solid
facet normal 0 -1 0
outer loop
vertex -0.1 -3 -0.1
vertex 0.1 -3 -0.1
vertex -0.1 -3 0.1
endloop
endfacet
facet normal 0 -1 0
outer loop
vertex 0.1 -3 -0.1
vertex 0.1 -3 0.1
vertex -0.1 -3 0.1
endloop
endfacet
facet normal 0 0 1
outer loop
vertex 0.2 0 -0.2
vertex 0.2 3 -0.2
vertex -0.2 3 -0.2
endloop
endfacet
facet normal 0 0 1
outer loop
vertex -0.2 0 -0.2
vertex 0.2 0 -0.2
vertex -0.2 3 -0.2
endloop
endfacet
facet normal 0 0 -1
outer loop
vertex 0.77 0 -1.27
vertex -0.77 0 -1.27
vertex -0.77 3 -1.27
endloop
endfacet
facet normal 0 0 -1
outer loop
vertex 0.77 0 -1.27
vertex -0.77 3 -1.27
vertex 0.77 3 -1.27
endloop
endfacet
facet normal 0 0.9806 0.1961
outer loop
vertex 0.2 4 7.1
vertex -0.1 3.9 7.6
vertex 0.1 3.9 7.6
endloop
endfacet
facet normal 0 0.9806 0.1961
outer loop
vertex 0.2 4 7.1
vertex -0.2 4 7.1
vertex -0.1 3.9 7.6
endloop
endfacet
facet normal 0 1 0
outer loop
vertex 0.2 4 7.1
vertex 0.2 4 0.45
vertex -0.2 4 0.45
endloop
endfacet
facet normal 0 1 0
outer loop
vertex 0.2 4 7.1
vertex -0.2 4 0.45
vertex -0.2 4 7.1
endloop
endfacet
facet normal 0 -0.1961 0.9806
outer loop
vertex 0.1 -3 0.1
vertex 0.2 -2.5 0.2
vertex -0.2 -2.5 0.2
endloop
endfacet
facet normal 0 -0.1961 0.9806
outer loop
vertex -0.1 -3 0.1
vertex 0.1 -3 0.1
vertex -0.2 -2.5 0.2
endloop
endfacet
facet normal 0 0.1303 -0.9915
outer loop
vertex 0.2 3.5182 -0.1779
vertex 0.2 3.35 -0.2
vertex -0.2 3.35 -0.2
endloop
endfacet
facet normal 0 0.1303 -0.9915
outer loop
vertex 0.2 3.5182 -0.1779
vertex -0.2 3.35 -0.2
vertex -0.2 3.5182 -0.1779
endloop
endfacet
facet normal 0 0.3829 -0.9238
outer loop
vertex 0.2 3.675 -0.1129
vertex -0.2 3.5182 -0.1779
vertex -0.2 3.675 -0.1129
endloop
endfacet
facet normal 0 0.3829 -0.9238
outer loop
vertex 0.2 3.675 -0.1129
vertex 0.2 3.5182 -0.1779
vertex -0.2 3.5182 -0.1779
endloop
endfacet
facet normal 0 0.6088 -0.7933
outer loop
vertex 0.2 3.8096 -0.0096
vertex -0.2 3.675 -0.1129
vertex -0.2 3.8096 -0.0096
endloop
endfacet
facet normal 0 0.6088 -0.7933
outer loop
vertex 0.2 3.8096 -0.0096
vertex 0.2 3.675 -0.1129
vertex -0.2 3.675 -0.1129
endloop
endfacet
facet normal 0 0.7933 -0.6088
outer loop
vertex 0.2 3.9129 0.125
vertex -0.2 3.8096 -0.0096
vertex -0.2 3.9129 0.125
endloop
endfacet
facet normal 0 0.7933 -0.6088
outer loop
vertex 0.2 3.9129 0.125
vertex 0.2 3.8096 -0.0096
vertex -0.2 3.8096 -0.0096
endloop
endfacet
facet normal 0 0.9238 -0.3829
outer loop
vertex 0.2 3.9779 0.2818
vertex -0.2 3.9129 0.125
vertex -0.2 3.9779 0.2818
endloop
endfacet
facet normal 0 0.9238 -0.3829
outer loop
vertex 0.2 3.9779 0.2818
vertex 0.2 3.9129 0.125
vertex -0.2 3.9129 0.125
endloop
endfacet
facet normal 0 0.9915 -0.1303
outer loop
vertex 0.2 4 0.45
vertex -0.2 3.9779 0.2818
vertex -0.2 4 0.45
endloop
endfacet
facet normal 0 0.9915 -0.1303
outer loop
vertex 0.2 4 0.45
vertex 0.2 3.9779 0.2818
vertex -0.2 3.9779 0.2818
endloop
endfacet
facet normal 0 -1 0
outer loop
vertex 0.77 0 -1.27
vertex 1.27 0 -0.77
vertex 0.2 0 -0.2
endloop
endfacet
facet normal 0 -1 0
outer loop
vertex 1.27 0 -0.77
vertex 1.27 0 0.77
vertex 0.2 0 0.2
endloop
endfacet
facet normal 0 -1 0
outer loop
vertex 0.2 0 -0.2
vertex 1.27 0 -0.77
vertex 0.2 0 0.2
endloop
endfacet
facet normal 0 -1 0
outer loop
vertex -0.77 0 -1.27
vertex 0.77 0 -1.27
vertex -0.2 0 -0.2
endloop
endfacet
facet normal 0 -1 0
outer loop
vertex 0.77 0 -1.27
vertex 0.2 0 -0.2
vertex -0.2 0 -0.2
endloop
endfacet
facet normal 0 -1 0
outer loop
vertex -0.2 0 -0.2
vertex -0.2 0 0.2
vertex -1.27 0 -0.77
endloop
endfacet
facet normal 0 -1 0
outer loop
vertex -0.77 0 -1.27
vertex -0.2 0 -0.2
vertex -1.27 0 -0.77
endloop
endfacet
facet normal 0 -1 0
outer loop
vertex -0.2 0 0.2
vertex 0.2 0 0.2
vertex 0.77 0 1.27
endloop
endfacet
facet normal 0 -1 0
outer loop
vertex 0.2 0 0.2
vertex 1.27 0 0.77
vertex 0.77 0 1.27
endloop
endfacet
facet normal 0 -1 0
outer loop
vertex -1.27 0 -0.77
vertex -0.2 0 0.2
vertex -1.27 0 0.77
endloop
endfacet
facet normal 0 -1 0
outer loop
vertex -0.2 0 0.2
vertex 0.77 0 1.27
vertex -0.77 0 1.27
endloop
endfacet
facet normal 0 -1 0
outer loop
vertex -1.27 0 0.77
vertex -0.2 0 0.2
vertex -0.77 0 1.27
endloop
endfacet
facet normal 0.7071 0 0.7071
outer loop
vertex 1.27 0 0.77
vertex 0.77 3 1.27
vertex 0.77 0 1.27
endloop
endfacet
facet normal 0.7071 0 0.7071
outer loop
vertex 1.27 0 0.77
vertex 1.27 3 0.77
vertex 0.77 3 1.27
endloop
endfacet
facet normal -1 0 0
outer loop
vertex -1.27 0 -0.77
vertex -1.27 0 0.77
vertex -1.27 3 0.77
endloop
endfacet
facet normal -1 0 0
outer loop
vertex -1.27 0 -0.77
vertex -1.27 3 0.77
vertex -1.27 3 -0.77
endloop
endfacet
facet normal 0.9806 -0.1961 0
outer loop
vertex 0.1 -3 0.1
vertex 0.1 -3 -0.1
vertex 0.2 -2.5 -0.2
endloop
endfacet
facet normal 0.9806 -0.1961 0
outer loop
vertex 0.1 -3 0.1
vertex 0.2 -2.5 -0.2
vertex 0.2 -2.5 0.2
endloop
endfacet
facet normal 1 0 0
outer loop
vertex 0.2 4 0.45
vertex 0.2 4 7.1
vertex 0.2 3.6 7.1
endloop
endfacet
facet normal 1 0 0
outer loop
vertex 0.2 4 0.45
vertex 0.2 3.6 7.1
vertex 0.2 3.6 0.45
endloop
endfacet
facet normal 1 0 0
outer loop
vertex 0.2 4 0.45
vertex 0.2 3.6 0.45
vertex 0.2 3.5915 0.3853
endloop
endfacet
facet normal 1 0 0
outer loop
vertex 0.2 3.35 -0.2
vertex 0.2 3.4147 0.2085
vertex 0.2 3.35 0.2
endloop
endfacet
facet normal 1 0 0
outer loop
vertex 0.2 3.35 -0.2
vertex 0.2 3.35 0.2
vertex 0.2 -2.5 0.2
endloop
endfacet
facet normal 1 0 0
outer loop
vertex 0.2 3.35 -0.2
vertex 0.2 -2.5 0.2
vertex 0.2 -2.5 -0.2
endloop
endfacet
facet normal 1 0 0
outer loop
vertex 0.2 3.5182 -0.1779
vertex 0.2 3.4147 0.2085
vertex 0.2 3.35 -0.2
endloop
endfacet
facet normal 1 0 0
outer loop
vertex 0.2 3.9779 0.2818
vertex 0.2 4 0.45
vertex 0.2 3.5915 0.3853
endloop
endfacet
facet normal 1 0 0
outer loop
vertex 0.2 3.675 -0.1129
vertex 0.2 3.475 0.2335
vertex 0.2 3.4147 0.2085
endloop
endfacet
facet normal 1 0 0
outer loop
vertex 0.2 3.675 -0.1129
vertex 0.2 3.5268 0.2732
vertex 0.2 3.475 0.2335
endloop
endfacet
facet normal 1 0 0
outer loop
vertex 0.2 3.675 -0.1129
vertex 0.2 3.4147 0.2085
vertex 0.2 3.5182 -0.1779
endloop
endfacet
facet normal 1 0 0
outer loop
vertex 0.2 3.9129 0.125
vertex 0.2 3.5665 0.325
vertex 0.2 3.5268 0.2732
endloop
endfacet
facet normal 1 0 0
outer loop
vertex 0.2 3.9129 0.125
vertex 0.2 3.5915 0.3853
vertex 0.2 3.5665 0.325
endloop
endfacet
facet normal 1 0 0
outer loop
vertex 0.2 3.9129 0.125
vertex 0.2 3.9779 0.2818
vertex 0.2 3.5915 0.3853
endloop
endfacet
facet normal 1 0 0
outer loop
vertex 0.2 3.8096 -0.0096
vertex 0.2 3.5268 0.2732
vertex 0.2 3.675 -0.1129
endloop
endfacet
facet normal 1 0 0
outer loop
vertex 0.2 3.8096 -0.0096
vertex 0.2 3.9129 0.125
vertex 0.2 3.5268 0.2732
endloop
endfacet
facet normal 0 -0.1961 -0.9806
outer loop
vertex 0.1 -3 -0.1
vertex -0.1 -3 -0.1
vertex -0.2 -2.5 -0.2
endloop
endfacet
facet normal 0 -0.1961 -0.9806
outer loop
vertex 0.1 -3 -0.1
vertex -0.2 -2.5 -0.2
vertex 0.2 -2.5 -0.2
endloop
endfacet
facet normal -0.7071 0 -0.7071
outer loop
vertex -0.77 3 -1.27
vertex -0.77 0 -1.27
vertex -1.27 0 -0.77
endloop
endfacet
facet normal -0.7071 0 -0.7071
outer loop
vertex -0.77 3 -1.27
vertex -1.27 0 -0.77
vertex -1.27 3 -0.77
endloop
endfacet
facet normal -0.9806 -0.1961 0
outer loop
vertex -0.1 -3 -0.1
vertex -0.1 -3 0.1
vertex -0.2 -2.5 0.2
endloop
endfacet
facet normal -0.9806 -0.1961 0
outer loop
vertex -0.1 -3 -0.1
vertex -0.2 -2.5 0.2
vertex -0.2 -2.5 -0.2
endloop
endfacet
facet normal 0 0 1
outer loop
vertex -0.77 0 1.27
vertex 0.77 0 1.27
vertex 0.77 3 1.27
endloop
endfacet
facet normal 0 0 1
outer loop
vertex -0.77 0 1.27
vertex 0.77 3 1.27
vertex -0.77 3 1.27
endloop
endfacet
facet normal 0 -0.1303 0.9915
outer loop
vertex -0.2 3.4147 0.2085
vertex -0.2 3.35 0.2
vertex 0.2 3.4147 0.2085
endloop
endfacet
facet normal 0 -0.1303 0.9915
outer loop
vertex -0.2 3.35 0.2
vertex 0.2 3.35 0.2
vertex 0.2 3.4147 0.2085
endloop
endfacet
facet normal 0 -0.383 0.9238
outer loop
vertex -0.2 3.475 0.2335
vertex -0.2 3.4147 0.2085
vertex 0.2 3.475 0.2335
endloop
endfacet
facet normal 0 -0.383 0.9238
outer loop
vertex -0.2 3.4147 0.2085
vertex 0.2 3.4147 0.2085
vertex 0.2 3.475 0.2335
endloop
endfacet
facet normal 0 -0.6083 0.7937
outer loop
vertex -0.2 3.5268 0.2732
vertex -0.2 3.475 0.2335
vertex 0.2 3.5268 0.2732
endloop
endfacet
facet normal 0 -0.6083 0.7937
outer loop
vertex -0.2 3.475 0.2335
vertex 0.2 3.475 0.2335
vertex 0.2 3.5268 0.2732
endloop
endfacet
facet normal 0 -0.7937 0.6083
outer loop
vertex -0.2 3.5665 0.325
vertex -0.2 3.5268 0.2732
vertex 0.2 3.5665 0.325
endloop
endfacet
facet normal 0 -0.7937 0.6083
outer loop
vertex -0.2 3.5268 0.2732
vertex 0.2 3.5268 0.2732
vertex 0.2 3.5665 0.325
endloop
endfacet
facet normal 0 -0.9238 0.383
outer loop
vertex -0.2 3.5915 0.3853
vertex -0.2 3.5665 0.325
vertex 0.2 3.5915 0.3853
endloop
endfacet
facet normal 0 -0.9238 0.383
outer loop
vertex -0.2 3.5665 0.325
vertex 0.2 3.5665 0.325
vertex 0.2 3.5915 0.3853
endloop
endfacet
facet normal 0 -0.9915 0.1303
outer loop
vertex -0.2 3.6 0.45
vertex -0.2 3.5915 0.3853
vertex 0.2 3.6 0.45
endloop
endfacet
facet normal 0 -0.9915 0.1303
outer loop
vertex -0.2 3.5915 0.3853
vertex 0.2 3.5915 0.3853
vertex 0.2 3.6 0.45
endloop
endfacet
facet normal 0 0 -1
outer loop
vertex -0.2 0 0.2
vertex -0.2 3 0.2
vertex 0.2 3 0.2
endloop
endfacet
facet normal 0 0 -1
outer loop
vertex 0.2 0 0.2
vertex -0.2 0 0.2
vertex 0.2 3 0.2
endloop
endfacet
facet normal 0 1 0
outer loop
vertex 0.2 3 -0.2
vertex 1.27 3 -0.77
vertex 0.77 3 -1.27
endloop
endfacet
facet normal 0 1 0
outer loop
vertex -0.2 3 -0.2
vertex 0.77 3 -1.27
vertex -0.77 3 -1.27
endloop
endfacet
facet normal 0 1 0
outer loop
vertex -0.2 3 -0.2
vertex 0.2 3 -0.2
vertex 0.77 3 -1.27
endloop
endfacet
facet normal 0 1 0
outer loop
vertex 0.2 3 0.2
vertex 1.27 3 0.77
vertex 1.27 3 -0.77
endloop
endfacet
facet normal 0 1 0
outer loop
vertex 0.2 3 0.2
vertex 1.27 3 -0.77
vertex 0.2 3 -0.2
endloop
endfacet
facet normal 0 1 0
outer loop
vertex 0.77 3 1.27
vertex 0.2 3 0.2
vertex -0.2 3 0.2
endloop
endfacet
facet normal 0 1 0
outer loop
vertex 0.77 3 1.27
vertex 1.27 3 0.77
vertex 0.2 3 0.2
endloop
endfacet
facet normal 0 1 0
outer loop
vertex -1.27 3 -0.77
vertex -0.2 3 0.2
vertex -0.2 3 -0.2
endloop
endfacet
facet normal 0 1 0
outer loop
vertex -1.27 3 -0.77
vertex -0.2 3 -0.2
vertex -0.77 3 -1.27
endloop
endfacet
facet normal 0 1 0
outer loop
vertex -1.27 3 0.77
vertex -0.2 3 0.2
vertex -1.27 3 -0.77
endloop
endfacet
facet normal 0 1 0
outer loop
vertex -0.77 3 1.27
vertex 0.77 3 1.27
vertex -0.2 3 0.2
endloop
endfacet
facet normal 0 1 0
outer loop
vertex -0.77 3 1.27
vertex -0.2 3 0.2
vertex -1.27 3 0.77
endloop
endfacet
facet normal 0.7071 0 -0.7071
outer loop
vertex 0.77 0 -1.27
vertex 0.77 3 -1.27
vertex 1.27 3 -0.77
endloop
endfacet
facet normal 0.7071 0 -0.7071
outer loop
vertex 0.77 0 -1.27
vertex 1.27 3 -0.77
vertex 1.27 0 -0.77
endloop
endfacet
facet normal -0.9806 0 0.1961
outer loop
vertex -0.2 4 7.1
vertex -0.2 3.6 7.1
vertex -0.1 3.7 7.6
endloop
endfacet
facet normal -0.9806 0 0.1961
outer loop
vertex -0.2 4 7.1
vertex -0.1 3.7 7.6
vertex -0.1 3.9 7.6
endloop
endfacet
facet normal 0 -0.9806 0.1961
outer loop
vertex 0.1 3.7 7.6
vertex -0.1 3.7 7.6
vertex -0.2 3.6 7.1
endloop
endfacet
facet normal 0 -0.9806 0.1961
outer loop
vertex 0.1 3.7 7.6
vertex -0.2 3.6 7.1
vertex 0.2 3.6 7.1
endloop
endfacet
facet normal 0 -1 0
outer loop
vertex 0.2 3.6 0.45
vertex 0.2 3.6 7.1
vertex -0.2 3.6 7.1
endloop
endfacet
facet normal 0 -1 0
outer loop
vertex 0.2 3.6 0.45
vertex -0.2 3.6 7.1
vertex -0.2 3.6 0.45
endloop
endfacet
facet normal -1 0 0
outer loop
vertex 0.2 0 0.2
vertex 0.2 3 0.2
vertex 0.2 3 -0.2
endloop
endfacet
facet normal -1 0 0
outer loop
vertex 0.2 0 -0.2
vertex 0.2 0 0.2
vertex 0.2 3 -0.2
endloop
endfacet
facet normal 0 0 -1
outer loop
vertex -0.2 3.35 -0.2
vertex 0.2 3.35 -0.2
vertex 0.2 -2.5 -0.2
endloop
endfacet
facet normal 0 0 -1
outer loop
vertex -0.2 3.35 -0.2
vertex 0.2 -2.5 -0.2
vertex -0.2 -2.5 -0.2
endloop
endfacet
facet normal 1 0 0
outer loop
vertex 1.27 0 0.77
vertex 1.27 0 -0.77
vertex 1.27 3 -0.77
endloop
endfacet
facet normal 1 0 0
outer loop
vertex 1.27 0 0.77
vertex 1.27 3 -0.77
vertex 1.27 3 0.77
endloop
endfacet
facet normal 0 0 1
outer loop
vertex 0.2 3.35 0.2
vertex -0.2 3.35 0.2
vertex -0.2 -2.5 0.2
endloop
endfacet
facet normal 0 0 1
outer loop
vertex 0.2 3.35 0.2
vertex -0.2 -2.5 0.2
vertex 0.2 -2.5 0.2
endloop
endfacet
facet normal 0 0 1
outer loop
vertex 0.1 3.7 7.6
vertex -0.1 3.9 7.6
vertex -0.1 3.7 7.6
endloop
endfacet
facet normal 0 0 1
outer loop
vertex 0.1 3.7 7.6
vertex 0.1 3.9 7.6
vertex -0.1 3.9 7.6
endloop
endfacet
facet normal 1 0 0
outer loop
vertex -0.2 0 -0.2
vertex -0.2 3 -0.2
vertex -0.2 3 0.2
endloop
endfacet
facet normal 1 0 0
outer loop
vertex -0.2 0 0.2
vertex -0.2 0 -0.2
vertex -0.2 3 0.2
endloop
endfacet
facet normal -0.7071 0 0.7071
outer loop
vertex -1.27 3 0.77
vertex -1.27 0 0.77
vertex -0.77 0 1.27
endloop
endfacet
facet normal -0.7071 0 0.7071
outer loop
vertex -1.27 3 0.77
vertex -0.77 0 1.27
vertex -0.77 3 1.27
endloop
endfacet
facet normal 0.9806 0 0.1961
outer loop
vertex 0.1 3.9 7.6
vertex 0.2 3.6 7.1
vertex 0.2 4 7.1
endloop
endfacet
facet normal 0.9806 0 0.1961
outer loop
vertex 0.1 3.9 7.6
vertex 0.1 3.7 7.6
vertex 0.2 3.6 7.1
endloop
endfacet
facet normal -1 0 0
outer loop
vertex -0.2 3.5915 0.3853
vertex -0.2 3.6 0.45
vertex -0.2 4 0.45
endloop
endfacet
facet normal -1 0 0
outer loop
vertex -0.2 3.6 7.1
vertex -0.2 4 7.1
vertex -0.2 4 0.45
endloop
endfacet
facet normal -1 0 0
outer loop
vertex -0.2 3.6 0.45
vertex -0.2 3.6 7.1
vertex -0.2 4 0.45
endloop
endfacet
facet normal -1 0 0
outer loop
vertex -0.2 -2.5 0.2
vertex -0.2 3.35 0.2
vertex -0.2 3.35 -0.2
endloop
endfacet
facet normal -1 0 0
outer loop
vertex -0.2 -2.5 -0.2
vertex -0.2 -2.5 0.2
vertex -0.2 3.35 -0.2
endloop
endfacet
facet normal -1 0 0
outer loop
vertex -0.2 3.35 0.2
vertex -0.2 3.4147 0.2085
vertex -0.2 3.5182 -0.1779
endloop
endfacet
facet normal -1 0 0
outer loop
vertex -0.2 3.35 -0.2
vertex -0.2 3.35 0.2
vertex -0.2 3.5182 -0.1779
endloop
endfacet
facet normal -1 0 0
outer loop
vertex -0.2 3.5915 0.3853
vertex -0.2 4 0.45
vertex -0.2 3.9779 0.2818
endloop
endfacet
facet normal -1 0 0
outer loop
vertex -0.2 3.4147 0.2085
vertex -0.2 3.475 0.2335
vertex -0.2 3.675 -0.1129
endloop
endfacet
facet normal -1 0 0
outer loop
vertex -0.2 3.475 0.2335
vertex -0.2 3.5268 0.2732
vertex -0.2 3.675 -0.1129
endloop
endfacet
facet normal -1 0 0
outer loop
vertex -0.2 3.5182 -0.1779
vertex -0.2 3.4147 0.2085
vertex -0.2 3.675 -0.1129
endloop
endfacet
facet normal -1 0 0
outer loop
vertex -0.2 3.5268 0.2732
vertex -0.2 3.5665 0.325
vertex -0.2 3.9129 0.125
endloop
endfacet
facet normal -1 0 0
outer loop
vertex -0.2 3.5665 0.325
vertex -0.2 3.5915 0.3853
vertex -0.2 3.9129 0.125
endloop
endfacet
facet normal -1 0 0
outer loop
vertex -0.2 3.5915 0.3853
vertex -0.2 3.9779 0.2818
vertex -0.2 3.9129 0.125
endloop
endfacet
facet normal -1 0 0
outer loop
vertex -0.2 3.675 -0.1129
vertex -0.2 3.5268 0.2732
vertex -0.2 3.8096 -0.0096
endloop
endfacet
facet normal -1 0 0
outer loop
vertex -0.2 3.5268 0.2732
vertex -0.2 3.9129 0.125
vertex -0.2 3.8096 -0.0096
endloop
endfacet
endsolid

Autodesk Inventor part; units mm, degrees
ref_plane "YZ Plane" through (0, 0, 0) normal (1, 0, 0) x (0, 1, 0)
ref_plane "XZ Plane" through (0, 0, 0) normal (0, 1, 0) x (-1, 0, 0)
ref_plane "XY Plane" through (0, 0, 0) normal (0, 0, 1) x (1, 0, 0)
sketch "Sketch1" plane through (0, 0, 0) normal (0, 1, 0) x (-1, 0, 0)
  line L0 (-1.27, 1.27) -> (1.27, 1.27)
  line L1 (1.27, 1.27) -> (1.27, -1.27)
  line L2 (1.27, -1.27) -> (-1.27, -1.27)
  line L3 (-1.27, -1.27) -> (-1.27, 1.27)
  line L4 (-1.27, 1.27) -> (1.27, -1.27) construction
  line L5 (1.27, 1.27) -> (-1.27, -1.27) construction
  line L6 (-0.3, 0.3) -> (0.3, 0.3)
  line L7 (0.3, 0.3) -> (0.3, -0.3)
  line L8 (0.3, -0.3) -> (-0.3, -0.3)
  line L9 (-0.3, -0.3) -> (-0.3, 0.3)
  line L10 (-0.3, 0.3) -> (0.3, -0.3) construction
  line L11 (0.3, 0.3) -> (-0.3, -0.3) construction
  point P0 (0, 0)
  dimension "d0" = 2.54
  dimension "d1" = 2.54
  dimension "d2" = 0.6
  dimension "d3" = 0.6
extrude "Extrusion1" add sketch "Sketch1" along normal blind 9 and the other way blind 3 contours L6 L7 L8 L9
extrude "Extrusion2" add sketch "Sketch1" along normal blind 3 separate body
sketch "Sketch2" plane through (0, 9, 0) normal (0, 1, 0) x (1, 0, 0)
  line L0 (-0.2, -0.2) -> (0.2, -0.2)
  line L1 (0.2, -0.2) -> (0.2, 0.2)
  line L2 (0.2, 0.2) -> (-0.2, 0.2)
  line L3 (-0.2, 0.2) -> (-0.2, -0.2)
  line L4 (-0.2, -0.2) -> (0.2, 0.2) construction
  line L5 (0.2, -0.2) -> (-0.2, 0.2) construction
  line L6 (-2.0289, -1.4927) -> (2.0289, -1.4927)
  line L7 (2.0289, -1.4927) -> (2.0289, 1.4927)
  line L8 (2.0289, 1.4927) -> (-2.0289, 1.4927)
  line L9 (-2.0289, 1.4927) -> (-2.0289, -1.4927)
  line L10 (-2.0289, -1.4927) -> (2.0289, 1.4927) construction
  line L11 (2.0289, -1.4927) -> (-2.0289, 1.4927) construction
  point P0 (0, 0)
  dimension "d37" = 0.4
  dimension "d38" = 0.4
extrude "Extrusion3" cut sketch "Sketch2" against normal blind 20 bodies 1
sketch "Sketch3" plane through (0, 3, 0) normal (0, 1, 0) x (1, 0, 0)
  line L0 (-0.3, 0.3) -> (0.3, 0.3) projected
  line L1 (-0.3, -0.3) -> (0.3, -0.3)
  line L2 (0.3, -0.3) -> (0.3, 0.3)
  line L3 (0.3, 0.3) -> (-0.3, 0.3)
  line L4 (-0.3, 0.3) -> (-0.3, -0.3)
  line L5 (-0.3, -0.3) -> (0.3, 0.3) construction
  line L6 (0.3, -0.3) -> (-0.3, 0.3) construction
  line L7 (0.2, -0.2) -> (0.2, 0.2) projected
  line L8 (-0.2, -0.2) -> (0.2, -0.2)
  line L9 (0.2, -0.2) -> (0.2, 0.2)
  line L10 (0.2, 0.2) -> (-0.2, 0.2)
  line L11 (-0.2, 0.2) -> (-0.2, -0.2)
  line L12 (-0.2, -0.2) -> (0.2, 0.2) construction
  line L13 (0.2, -0.2) -> (-0.2, 0.2) construction
  point P0 (0, 0)
extrude "Extrusion4" add sketch "Sketch3" against normal blind 3 bodies 2
chamfer "Chamfer10" distance 0.5 angle 45 4 edges at (1.27, 1.5, -1.27) (-1.27, 1.5, -1.27) (-1.27, 1.5, 1.27) (1.27, 1.5, 1.27)
chamfer "Chamfer11" distance 0.1 distance2 0.5 1 edges at (0.2, 9, 0) measured on face at (-0.0667, 9, -0.0667)
chamfer "Chamfer12" distance 0.1 distance2 0.5 1 edges at (-0.05, 9, 0.2) measured on face at (-0.1, 9, -0.0667)
chamfer "Chamfer13" distance 0.1 distance2 0.5 1 edges at (-0.2, 9, -0.05) measured on face at (-0.1, 9, -0.1)
chamfer "Chamfer14" distance 0.1 distance2 0.5 1 edges at (0, 9, -0.2) measured on face at (0.0333, 9, 0)
chamfer "Chamfer15" distance 0.1 distance2 0.5 1 edges at (-0.2, -3, 0) measured on face at (-0.0667, -3, -0.0667)
chamfer "Chamfer16" distance 0.1 distance2 0.5 1 edges at (0.05, -3, 0.2) measured on face at (0, -3, -0.0667)
chamfer "Chamfer17" distance 0.1 distance2 0.5 1 edges at (0.2, -3, -0.05) measured on face at (0.1, -3, 0)
chamfer "Chamfer18" distance 0.1 distance2 0.5 1 edges at (0, -3, -0.2) measured on face at (0.0333, -3, 0)
sketch "Sketch4" plane through (0.2, 8.5, 0.2) normal (1, 0, 0) x (0, 0, -1)
  line L0 (0.4, 0) -> (0.4, -11) projected
  line L1 (0.4, -4.5) -> (-7.4, -4.5)
  line L2 (-7.4, -4.5) -> (-7.4, -4.9)
  line L3 (-7.4, -4.9) -> (-0.25, -4.9)
  line L4 (0.4, -4.9) -> (0.4, -4.5)
  line L5 (0.1, -11.5) -> (0.3, -11.5) projected
  line L6 (0, 0) -> (0, -11) projected
  line L7 (0, -5.15) -> (0, -5.5)
  arc A0 (0, -5.15) -> (-0.25, -4.9) centre (-0.25, -5.15) ccw
  arc A1 (0.4, -5.15) -> (-0.25, -4.5) centre (-0.25, -5.15) ccw
  line L8 (0, -5.15) -> (0.4, -5.15)
  line L9 (0.4, -4.9) -> (0.4, -5.15)
  line L10 (0.4, -4.5) -> (0, -4.5)
  line L11 (0, -4.5) -> (0, 0.5)
  line L12 (0, 0.5) -> (0.4, 0.5)
  line L13 (0.4, 0.5) -> (0.4, -4.5)
  point P0 (0.2, -8.5)
  point P1 (0, -4.9)
  point P2 (0, -4.55)
  dimension "d70" = 0.4
  dimension "d71" = 7
  dimension "d72" = 7.8
  dimension "d73" = 0.25
extrude "Extrusion5" cut sketch "Sketch4" against normal through all contours L0 L1 L6 L11 L12 L13 | L0 A1 L6 L1 bodies 1
extrude "Extrusion6" add sketch "Sketch4" against normal up to surface (0.4 mm away) contours A1 L6 A0 L3 L2 L1 bodies 1
chamfer "Chamfer19" distance 0.5 distance2 0.1 1 edges at (0.2, 3.8, 7.6) measured on face at (0.2, 3.7333, 2.8333)
chamfer "Chamfer20" distance 0.5 distance2 0.1 1 edges at (-0.2, 3.8, 7.6) measured on face at (-0.2, 3.7333, 2.8333)
chamfer "Chamfer21" distance 0.1 distance2 0.5 1 edges at (0, 4, 7.6) measured on face at (0.0333, 3.8667, 7.6)
chamfer "Chamfer22" distance 0.5 distance2 0.1 1 edges at (0, 3.6, 7.6) measured on face at (-0.0667, 3.6, 2.6667)
properties part number "MaleHeaderPin"
